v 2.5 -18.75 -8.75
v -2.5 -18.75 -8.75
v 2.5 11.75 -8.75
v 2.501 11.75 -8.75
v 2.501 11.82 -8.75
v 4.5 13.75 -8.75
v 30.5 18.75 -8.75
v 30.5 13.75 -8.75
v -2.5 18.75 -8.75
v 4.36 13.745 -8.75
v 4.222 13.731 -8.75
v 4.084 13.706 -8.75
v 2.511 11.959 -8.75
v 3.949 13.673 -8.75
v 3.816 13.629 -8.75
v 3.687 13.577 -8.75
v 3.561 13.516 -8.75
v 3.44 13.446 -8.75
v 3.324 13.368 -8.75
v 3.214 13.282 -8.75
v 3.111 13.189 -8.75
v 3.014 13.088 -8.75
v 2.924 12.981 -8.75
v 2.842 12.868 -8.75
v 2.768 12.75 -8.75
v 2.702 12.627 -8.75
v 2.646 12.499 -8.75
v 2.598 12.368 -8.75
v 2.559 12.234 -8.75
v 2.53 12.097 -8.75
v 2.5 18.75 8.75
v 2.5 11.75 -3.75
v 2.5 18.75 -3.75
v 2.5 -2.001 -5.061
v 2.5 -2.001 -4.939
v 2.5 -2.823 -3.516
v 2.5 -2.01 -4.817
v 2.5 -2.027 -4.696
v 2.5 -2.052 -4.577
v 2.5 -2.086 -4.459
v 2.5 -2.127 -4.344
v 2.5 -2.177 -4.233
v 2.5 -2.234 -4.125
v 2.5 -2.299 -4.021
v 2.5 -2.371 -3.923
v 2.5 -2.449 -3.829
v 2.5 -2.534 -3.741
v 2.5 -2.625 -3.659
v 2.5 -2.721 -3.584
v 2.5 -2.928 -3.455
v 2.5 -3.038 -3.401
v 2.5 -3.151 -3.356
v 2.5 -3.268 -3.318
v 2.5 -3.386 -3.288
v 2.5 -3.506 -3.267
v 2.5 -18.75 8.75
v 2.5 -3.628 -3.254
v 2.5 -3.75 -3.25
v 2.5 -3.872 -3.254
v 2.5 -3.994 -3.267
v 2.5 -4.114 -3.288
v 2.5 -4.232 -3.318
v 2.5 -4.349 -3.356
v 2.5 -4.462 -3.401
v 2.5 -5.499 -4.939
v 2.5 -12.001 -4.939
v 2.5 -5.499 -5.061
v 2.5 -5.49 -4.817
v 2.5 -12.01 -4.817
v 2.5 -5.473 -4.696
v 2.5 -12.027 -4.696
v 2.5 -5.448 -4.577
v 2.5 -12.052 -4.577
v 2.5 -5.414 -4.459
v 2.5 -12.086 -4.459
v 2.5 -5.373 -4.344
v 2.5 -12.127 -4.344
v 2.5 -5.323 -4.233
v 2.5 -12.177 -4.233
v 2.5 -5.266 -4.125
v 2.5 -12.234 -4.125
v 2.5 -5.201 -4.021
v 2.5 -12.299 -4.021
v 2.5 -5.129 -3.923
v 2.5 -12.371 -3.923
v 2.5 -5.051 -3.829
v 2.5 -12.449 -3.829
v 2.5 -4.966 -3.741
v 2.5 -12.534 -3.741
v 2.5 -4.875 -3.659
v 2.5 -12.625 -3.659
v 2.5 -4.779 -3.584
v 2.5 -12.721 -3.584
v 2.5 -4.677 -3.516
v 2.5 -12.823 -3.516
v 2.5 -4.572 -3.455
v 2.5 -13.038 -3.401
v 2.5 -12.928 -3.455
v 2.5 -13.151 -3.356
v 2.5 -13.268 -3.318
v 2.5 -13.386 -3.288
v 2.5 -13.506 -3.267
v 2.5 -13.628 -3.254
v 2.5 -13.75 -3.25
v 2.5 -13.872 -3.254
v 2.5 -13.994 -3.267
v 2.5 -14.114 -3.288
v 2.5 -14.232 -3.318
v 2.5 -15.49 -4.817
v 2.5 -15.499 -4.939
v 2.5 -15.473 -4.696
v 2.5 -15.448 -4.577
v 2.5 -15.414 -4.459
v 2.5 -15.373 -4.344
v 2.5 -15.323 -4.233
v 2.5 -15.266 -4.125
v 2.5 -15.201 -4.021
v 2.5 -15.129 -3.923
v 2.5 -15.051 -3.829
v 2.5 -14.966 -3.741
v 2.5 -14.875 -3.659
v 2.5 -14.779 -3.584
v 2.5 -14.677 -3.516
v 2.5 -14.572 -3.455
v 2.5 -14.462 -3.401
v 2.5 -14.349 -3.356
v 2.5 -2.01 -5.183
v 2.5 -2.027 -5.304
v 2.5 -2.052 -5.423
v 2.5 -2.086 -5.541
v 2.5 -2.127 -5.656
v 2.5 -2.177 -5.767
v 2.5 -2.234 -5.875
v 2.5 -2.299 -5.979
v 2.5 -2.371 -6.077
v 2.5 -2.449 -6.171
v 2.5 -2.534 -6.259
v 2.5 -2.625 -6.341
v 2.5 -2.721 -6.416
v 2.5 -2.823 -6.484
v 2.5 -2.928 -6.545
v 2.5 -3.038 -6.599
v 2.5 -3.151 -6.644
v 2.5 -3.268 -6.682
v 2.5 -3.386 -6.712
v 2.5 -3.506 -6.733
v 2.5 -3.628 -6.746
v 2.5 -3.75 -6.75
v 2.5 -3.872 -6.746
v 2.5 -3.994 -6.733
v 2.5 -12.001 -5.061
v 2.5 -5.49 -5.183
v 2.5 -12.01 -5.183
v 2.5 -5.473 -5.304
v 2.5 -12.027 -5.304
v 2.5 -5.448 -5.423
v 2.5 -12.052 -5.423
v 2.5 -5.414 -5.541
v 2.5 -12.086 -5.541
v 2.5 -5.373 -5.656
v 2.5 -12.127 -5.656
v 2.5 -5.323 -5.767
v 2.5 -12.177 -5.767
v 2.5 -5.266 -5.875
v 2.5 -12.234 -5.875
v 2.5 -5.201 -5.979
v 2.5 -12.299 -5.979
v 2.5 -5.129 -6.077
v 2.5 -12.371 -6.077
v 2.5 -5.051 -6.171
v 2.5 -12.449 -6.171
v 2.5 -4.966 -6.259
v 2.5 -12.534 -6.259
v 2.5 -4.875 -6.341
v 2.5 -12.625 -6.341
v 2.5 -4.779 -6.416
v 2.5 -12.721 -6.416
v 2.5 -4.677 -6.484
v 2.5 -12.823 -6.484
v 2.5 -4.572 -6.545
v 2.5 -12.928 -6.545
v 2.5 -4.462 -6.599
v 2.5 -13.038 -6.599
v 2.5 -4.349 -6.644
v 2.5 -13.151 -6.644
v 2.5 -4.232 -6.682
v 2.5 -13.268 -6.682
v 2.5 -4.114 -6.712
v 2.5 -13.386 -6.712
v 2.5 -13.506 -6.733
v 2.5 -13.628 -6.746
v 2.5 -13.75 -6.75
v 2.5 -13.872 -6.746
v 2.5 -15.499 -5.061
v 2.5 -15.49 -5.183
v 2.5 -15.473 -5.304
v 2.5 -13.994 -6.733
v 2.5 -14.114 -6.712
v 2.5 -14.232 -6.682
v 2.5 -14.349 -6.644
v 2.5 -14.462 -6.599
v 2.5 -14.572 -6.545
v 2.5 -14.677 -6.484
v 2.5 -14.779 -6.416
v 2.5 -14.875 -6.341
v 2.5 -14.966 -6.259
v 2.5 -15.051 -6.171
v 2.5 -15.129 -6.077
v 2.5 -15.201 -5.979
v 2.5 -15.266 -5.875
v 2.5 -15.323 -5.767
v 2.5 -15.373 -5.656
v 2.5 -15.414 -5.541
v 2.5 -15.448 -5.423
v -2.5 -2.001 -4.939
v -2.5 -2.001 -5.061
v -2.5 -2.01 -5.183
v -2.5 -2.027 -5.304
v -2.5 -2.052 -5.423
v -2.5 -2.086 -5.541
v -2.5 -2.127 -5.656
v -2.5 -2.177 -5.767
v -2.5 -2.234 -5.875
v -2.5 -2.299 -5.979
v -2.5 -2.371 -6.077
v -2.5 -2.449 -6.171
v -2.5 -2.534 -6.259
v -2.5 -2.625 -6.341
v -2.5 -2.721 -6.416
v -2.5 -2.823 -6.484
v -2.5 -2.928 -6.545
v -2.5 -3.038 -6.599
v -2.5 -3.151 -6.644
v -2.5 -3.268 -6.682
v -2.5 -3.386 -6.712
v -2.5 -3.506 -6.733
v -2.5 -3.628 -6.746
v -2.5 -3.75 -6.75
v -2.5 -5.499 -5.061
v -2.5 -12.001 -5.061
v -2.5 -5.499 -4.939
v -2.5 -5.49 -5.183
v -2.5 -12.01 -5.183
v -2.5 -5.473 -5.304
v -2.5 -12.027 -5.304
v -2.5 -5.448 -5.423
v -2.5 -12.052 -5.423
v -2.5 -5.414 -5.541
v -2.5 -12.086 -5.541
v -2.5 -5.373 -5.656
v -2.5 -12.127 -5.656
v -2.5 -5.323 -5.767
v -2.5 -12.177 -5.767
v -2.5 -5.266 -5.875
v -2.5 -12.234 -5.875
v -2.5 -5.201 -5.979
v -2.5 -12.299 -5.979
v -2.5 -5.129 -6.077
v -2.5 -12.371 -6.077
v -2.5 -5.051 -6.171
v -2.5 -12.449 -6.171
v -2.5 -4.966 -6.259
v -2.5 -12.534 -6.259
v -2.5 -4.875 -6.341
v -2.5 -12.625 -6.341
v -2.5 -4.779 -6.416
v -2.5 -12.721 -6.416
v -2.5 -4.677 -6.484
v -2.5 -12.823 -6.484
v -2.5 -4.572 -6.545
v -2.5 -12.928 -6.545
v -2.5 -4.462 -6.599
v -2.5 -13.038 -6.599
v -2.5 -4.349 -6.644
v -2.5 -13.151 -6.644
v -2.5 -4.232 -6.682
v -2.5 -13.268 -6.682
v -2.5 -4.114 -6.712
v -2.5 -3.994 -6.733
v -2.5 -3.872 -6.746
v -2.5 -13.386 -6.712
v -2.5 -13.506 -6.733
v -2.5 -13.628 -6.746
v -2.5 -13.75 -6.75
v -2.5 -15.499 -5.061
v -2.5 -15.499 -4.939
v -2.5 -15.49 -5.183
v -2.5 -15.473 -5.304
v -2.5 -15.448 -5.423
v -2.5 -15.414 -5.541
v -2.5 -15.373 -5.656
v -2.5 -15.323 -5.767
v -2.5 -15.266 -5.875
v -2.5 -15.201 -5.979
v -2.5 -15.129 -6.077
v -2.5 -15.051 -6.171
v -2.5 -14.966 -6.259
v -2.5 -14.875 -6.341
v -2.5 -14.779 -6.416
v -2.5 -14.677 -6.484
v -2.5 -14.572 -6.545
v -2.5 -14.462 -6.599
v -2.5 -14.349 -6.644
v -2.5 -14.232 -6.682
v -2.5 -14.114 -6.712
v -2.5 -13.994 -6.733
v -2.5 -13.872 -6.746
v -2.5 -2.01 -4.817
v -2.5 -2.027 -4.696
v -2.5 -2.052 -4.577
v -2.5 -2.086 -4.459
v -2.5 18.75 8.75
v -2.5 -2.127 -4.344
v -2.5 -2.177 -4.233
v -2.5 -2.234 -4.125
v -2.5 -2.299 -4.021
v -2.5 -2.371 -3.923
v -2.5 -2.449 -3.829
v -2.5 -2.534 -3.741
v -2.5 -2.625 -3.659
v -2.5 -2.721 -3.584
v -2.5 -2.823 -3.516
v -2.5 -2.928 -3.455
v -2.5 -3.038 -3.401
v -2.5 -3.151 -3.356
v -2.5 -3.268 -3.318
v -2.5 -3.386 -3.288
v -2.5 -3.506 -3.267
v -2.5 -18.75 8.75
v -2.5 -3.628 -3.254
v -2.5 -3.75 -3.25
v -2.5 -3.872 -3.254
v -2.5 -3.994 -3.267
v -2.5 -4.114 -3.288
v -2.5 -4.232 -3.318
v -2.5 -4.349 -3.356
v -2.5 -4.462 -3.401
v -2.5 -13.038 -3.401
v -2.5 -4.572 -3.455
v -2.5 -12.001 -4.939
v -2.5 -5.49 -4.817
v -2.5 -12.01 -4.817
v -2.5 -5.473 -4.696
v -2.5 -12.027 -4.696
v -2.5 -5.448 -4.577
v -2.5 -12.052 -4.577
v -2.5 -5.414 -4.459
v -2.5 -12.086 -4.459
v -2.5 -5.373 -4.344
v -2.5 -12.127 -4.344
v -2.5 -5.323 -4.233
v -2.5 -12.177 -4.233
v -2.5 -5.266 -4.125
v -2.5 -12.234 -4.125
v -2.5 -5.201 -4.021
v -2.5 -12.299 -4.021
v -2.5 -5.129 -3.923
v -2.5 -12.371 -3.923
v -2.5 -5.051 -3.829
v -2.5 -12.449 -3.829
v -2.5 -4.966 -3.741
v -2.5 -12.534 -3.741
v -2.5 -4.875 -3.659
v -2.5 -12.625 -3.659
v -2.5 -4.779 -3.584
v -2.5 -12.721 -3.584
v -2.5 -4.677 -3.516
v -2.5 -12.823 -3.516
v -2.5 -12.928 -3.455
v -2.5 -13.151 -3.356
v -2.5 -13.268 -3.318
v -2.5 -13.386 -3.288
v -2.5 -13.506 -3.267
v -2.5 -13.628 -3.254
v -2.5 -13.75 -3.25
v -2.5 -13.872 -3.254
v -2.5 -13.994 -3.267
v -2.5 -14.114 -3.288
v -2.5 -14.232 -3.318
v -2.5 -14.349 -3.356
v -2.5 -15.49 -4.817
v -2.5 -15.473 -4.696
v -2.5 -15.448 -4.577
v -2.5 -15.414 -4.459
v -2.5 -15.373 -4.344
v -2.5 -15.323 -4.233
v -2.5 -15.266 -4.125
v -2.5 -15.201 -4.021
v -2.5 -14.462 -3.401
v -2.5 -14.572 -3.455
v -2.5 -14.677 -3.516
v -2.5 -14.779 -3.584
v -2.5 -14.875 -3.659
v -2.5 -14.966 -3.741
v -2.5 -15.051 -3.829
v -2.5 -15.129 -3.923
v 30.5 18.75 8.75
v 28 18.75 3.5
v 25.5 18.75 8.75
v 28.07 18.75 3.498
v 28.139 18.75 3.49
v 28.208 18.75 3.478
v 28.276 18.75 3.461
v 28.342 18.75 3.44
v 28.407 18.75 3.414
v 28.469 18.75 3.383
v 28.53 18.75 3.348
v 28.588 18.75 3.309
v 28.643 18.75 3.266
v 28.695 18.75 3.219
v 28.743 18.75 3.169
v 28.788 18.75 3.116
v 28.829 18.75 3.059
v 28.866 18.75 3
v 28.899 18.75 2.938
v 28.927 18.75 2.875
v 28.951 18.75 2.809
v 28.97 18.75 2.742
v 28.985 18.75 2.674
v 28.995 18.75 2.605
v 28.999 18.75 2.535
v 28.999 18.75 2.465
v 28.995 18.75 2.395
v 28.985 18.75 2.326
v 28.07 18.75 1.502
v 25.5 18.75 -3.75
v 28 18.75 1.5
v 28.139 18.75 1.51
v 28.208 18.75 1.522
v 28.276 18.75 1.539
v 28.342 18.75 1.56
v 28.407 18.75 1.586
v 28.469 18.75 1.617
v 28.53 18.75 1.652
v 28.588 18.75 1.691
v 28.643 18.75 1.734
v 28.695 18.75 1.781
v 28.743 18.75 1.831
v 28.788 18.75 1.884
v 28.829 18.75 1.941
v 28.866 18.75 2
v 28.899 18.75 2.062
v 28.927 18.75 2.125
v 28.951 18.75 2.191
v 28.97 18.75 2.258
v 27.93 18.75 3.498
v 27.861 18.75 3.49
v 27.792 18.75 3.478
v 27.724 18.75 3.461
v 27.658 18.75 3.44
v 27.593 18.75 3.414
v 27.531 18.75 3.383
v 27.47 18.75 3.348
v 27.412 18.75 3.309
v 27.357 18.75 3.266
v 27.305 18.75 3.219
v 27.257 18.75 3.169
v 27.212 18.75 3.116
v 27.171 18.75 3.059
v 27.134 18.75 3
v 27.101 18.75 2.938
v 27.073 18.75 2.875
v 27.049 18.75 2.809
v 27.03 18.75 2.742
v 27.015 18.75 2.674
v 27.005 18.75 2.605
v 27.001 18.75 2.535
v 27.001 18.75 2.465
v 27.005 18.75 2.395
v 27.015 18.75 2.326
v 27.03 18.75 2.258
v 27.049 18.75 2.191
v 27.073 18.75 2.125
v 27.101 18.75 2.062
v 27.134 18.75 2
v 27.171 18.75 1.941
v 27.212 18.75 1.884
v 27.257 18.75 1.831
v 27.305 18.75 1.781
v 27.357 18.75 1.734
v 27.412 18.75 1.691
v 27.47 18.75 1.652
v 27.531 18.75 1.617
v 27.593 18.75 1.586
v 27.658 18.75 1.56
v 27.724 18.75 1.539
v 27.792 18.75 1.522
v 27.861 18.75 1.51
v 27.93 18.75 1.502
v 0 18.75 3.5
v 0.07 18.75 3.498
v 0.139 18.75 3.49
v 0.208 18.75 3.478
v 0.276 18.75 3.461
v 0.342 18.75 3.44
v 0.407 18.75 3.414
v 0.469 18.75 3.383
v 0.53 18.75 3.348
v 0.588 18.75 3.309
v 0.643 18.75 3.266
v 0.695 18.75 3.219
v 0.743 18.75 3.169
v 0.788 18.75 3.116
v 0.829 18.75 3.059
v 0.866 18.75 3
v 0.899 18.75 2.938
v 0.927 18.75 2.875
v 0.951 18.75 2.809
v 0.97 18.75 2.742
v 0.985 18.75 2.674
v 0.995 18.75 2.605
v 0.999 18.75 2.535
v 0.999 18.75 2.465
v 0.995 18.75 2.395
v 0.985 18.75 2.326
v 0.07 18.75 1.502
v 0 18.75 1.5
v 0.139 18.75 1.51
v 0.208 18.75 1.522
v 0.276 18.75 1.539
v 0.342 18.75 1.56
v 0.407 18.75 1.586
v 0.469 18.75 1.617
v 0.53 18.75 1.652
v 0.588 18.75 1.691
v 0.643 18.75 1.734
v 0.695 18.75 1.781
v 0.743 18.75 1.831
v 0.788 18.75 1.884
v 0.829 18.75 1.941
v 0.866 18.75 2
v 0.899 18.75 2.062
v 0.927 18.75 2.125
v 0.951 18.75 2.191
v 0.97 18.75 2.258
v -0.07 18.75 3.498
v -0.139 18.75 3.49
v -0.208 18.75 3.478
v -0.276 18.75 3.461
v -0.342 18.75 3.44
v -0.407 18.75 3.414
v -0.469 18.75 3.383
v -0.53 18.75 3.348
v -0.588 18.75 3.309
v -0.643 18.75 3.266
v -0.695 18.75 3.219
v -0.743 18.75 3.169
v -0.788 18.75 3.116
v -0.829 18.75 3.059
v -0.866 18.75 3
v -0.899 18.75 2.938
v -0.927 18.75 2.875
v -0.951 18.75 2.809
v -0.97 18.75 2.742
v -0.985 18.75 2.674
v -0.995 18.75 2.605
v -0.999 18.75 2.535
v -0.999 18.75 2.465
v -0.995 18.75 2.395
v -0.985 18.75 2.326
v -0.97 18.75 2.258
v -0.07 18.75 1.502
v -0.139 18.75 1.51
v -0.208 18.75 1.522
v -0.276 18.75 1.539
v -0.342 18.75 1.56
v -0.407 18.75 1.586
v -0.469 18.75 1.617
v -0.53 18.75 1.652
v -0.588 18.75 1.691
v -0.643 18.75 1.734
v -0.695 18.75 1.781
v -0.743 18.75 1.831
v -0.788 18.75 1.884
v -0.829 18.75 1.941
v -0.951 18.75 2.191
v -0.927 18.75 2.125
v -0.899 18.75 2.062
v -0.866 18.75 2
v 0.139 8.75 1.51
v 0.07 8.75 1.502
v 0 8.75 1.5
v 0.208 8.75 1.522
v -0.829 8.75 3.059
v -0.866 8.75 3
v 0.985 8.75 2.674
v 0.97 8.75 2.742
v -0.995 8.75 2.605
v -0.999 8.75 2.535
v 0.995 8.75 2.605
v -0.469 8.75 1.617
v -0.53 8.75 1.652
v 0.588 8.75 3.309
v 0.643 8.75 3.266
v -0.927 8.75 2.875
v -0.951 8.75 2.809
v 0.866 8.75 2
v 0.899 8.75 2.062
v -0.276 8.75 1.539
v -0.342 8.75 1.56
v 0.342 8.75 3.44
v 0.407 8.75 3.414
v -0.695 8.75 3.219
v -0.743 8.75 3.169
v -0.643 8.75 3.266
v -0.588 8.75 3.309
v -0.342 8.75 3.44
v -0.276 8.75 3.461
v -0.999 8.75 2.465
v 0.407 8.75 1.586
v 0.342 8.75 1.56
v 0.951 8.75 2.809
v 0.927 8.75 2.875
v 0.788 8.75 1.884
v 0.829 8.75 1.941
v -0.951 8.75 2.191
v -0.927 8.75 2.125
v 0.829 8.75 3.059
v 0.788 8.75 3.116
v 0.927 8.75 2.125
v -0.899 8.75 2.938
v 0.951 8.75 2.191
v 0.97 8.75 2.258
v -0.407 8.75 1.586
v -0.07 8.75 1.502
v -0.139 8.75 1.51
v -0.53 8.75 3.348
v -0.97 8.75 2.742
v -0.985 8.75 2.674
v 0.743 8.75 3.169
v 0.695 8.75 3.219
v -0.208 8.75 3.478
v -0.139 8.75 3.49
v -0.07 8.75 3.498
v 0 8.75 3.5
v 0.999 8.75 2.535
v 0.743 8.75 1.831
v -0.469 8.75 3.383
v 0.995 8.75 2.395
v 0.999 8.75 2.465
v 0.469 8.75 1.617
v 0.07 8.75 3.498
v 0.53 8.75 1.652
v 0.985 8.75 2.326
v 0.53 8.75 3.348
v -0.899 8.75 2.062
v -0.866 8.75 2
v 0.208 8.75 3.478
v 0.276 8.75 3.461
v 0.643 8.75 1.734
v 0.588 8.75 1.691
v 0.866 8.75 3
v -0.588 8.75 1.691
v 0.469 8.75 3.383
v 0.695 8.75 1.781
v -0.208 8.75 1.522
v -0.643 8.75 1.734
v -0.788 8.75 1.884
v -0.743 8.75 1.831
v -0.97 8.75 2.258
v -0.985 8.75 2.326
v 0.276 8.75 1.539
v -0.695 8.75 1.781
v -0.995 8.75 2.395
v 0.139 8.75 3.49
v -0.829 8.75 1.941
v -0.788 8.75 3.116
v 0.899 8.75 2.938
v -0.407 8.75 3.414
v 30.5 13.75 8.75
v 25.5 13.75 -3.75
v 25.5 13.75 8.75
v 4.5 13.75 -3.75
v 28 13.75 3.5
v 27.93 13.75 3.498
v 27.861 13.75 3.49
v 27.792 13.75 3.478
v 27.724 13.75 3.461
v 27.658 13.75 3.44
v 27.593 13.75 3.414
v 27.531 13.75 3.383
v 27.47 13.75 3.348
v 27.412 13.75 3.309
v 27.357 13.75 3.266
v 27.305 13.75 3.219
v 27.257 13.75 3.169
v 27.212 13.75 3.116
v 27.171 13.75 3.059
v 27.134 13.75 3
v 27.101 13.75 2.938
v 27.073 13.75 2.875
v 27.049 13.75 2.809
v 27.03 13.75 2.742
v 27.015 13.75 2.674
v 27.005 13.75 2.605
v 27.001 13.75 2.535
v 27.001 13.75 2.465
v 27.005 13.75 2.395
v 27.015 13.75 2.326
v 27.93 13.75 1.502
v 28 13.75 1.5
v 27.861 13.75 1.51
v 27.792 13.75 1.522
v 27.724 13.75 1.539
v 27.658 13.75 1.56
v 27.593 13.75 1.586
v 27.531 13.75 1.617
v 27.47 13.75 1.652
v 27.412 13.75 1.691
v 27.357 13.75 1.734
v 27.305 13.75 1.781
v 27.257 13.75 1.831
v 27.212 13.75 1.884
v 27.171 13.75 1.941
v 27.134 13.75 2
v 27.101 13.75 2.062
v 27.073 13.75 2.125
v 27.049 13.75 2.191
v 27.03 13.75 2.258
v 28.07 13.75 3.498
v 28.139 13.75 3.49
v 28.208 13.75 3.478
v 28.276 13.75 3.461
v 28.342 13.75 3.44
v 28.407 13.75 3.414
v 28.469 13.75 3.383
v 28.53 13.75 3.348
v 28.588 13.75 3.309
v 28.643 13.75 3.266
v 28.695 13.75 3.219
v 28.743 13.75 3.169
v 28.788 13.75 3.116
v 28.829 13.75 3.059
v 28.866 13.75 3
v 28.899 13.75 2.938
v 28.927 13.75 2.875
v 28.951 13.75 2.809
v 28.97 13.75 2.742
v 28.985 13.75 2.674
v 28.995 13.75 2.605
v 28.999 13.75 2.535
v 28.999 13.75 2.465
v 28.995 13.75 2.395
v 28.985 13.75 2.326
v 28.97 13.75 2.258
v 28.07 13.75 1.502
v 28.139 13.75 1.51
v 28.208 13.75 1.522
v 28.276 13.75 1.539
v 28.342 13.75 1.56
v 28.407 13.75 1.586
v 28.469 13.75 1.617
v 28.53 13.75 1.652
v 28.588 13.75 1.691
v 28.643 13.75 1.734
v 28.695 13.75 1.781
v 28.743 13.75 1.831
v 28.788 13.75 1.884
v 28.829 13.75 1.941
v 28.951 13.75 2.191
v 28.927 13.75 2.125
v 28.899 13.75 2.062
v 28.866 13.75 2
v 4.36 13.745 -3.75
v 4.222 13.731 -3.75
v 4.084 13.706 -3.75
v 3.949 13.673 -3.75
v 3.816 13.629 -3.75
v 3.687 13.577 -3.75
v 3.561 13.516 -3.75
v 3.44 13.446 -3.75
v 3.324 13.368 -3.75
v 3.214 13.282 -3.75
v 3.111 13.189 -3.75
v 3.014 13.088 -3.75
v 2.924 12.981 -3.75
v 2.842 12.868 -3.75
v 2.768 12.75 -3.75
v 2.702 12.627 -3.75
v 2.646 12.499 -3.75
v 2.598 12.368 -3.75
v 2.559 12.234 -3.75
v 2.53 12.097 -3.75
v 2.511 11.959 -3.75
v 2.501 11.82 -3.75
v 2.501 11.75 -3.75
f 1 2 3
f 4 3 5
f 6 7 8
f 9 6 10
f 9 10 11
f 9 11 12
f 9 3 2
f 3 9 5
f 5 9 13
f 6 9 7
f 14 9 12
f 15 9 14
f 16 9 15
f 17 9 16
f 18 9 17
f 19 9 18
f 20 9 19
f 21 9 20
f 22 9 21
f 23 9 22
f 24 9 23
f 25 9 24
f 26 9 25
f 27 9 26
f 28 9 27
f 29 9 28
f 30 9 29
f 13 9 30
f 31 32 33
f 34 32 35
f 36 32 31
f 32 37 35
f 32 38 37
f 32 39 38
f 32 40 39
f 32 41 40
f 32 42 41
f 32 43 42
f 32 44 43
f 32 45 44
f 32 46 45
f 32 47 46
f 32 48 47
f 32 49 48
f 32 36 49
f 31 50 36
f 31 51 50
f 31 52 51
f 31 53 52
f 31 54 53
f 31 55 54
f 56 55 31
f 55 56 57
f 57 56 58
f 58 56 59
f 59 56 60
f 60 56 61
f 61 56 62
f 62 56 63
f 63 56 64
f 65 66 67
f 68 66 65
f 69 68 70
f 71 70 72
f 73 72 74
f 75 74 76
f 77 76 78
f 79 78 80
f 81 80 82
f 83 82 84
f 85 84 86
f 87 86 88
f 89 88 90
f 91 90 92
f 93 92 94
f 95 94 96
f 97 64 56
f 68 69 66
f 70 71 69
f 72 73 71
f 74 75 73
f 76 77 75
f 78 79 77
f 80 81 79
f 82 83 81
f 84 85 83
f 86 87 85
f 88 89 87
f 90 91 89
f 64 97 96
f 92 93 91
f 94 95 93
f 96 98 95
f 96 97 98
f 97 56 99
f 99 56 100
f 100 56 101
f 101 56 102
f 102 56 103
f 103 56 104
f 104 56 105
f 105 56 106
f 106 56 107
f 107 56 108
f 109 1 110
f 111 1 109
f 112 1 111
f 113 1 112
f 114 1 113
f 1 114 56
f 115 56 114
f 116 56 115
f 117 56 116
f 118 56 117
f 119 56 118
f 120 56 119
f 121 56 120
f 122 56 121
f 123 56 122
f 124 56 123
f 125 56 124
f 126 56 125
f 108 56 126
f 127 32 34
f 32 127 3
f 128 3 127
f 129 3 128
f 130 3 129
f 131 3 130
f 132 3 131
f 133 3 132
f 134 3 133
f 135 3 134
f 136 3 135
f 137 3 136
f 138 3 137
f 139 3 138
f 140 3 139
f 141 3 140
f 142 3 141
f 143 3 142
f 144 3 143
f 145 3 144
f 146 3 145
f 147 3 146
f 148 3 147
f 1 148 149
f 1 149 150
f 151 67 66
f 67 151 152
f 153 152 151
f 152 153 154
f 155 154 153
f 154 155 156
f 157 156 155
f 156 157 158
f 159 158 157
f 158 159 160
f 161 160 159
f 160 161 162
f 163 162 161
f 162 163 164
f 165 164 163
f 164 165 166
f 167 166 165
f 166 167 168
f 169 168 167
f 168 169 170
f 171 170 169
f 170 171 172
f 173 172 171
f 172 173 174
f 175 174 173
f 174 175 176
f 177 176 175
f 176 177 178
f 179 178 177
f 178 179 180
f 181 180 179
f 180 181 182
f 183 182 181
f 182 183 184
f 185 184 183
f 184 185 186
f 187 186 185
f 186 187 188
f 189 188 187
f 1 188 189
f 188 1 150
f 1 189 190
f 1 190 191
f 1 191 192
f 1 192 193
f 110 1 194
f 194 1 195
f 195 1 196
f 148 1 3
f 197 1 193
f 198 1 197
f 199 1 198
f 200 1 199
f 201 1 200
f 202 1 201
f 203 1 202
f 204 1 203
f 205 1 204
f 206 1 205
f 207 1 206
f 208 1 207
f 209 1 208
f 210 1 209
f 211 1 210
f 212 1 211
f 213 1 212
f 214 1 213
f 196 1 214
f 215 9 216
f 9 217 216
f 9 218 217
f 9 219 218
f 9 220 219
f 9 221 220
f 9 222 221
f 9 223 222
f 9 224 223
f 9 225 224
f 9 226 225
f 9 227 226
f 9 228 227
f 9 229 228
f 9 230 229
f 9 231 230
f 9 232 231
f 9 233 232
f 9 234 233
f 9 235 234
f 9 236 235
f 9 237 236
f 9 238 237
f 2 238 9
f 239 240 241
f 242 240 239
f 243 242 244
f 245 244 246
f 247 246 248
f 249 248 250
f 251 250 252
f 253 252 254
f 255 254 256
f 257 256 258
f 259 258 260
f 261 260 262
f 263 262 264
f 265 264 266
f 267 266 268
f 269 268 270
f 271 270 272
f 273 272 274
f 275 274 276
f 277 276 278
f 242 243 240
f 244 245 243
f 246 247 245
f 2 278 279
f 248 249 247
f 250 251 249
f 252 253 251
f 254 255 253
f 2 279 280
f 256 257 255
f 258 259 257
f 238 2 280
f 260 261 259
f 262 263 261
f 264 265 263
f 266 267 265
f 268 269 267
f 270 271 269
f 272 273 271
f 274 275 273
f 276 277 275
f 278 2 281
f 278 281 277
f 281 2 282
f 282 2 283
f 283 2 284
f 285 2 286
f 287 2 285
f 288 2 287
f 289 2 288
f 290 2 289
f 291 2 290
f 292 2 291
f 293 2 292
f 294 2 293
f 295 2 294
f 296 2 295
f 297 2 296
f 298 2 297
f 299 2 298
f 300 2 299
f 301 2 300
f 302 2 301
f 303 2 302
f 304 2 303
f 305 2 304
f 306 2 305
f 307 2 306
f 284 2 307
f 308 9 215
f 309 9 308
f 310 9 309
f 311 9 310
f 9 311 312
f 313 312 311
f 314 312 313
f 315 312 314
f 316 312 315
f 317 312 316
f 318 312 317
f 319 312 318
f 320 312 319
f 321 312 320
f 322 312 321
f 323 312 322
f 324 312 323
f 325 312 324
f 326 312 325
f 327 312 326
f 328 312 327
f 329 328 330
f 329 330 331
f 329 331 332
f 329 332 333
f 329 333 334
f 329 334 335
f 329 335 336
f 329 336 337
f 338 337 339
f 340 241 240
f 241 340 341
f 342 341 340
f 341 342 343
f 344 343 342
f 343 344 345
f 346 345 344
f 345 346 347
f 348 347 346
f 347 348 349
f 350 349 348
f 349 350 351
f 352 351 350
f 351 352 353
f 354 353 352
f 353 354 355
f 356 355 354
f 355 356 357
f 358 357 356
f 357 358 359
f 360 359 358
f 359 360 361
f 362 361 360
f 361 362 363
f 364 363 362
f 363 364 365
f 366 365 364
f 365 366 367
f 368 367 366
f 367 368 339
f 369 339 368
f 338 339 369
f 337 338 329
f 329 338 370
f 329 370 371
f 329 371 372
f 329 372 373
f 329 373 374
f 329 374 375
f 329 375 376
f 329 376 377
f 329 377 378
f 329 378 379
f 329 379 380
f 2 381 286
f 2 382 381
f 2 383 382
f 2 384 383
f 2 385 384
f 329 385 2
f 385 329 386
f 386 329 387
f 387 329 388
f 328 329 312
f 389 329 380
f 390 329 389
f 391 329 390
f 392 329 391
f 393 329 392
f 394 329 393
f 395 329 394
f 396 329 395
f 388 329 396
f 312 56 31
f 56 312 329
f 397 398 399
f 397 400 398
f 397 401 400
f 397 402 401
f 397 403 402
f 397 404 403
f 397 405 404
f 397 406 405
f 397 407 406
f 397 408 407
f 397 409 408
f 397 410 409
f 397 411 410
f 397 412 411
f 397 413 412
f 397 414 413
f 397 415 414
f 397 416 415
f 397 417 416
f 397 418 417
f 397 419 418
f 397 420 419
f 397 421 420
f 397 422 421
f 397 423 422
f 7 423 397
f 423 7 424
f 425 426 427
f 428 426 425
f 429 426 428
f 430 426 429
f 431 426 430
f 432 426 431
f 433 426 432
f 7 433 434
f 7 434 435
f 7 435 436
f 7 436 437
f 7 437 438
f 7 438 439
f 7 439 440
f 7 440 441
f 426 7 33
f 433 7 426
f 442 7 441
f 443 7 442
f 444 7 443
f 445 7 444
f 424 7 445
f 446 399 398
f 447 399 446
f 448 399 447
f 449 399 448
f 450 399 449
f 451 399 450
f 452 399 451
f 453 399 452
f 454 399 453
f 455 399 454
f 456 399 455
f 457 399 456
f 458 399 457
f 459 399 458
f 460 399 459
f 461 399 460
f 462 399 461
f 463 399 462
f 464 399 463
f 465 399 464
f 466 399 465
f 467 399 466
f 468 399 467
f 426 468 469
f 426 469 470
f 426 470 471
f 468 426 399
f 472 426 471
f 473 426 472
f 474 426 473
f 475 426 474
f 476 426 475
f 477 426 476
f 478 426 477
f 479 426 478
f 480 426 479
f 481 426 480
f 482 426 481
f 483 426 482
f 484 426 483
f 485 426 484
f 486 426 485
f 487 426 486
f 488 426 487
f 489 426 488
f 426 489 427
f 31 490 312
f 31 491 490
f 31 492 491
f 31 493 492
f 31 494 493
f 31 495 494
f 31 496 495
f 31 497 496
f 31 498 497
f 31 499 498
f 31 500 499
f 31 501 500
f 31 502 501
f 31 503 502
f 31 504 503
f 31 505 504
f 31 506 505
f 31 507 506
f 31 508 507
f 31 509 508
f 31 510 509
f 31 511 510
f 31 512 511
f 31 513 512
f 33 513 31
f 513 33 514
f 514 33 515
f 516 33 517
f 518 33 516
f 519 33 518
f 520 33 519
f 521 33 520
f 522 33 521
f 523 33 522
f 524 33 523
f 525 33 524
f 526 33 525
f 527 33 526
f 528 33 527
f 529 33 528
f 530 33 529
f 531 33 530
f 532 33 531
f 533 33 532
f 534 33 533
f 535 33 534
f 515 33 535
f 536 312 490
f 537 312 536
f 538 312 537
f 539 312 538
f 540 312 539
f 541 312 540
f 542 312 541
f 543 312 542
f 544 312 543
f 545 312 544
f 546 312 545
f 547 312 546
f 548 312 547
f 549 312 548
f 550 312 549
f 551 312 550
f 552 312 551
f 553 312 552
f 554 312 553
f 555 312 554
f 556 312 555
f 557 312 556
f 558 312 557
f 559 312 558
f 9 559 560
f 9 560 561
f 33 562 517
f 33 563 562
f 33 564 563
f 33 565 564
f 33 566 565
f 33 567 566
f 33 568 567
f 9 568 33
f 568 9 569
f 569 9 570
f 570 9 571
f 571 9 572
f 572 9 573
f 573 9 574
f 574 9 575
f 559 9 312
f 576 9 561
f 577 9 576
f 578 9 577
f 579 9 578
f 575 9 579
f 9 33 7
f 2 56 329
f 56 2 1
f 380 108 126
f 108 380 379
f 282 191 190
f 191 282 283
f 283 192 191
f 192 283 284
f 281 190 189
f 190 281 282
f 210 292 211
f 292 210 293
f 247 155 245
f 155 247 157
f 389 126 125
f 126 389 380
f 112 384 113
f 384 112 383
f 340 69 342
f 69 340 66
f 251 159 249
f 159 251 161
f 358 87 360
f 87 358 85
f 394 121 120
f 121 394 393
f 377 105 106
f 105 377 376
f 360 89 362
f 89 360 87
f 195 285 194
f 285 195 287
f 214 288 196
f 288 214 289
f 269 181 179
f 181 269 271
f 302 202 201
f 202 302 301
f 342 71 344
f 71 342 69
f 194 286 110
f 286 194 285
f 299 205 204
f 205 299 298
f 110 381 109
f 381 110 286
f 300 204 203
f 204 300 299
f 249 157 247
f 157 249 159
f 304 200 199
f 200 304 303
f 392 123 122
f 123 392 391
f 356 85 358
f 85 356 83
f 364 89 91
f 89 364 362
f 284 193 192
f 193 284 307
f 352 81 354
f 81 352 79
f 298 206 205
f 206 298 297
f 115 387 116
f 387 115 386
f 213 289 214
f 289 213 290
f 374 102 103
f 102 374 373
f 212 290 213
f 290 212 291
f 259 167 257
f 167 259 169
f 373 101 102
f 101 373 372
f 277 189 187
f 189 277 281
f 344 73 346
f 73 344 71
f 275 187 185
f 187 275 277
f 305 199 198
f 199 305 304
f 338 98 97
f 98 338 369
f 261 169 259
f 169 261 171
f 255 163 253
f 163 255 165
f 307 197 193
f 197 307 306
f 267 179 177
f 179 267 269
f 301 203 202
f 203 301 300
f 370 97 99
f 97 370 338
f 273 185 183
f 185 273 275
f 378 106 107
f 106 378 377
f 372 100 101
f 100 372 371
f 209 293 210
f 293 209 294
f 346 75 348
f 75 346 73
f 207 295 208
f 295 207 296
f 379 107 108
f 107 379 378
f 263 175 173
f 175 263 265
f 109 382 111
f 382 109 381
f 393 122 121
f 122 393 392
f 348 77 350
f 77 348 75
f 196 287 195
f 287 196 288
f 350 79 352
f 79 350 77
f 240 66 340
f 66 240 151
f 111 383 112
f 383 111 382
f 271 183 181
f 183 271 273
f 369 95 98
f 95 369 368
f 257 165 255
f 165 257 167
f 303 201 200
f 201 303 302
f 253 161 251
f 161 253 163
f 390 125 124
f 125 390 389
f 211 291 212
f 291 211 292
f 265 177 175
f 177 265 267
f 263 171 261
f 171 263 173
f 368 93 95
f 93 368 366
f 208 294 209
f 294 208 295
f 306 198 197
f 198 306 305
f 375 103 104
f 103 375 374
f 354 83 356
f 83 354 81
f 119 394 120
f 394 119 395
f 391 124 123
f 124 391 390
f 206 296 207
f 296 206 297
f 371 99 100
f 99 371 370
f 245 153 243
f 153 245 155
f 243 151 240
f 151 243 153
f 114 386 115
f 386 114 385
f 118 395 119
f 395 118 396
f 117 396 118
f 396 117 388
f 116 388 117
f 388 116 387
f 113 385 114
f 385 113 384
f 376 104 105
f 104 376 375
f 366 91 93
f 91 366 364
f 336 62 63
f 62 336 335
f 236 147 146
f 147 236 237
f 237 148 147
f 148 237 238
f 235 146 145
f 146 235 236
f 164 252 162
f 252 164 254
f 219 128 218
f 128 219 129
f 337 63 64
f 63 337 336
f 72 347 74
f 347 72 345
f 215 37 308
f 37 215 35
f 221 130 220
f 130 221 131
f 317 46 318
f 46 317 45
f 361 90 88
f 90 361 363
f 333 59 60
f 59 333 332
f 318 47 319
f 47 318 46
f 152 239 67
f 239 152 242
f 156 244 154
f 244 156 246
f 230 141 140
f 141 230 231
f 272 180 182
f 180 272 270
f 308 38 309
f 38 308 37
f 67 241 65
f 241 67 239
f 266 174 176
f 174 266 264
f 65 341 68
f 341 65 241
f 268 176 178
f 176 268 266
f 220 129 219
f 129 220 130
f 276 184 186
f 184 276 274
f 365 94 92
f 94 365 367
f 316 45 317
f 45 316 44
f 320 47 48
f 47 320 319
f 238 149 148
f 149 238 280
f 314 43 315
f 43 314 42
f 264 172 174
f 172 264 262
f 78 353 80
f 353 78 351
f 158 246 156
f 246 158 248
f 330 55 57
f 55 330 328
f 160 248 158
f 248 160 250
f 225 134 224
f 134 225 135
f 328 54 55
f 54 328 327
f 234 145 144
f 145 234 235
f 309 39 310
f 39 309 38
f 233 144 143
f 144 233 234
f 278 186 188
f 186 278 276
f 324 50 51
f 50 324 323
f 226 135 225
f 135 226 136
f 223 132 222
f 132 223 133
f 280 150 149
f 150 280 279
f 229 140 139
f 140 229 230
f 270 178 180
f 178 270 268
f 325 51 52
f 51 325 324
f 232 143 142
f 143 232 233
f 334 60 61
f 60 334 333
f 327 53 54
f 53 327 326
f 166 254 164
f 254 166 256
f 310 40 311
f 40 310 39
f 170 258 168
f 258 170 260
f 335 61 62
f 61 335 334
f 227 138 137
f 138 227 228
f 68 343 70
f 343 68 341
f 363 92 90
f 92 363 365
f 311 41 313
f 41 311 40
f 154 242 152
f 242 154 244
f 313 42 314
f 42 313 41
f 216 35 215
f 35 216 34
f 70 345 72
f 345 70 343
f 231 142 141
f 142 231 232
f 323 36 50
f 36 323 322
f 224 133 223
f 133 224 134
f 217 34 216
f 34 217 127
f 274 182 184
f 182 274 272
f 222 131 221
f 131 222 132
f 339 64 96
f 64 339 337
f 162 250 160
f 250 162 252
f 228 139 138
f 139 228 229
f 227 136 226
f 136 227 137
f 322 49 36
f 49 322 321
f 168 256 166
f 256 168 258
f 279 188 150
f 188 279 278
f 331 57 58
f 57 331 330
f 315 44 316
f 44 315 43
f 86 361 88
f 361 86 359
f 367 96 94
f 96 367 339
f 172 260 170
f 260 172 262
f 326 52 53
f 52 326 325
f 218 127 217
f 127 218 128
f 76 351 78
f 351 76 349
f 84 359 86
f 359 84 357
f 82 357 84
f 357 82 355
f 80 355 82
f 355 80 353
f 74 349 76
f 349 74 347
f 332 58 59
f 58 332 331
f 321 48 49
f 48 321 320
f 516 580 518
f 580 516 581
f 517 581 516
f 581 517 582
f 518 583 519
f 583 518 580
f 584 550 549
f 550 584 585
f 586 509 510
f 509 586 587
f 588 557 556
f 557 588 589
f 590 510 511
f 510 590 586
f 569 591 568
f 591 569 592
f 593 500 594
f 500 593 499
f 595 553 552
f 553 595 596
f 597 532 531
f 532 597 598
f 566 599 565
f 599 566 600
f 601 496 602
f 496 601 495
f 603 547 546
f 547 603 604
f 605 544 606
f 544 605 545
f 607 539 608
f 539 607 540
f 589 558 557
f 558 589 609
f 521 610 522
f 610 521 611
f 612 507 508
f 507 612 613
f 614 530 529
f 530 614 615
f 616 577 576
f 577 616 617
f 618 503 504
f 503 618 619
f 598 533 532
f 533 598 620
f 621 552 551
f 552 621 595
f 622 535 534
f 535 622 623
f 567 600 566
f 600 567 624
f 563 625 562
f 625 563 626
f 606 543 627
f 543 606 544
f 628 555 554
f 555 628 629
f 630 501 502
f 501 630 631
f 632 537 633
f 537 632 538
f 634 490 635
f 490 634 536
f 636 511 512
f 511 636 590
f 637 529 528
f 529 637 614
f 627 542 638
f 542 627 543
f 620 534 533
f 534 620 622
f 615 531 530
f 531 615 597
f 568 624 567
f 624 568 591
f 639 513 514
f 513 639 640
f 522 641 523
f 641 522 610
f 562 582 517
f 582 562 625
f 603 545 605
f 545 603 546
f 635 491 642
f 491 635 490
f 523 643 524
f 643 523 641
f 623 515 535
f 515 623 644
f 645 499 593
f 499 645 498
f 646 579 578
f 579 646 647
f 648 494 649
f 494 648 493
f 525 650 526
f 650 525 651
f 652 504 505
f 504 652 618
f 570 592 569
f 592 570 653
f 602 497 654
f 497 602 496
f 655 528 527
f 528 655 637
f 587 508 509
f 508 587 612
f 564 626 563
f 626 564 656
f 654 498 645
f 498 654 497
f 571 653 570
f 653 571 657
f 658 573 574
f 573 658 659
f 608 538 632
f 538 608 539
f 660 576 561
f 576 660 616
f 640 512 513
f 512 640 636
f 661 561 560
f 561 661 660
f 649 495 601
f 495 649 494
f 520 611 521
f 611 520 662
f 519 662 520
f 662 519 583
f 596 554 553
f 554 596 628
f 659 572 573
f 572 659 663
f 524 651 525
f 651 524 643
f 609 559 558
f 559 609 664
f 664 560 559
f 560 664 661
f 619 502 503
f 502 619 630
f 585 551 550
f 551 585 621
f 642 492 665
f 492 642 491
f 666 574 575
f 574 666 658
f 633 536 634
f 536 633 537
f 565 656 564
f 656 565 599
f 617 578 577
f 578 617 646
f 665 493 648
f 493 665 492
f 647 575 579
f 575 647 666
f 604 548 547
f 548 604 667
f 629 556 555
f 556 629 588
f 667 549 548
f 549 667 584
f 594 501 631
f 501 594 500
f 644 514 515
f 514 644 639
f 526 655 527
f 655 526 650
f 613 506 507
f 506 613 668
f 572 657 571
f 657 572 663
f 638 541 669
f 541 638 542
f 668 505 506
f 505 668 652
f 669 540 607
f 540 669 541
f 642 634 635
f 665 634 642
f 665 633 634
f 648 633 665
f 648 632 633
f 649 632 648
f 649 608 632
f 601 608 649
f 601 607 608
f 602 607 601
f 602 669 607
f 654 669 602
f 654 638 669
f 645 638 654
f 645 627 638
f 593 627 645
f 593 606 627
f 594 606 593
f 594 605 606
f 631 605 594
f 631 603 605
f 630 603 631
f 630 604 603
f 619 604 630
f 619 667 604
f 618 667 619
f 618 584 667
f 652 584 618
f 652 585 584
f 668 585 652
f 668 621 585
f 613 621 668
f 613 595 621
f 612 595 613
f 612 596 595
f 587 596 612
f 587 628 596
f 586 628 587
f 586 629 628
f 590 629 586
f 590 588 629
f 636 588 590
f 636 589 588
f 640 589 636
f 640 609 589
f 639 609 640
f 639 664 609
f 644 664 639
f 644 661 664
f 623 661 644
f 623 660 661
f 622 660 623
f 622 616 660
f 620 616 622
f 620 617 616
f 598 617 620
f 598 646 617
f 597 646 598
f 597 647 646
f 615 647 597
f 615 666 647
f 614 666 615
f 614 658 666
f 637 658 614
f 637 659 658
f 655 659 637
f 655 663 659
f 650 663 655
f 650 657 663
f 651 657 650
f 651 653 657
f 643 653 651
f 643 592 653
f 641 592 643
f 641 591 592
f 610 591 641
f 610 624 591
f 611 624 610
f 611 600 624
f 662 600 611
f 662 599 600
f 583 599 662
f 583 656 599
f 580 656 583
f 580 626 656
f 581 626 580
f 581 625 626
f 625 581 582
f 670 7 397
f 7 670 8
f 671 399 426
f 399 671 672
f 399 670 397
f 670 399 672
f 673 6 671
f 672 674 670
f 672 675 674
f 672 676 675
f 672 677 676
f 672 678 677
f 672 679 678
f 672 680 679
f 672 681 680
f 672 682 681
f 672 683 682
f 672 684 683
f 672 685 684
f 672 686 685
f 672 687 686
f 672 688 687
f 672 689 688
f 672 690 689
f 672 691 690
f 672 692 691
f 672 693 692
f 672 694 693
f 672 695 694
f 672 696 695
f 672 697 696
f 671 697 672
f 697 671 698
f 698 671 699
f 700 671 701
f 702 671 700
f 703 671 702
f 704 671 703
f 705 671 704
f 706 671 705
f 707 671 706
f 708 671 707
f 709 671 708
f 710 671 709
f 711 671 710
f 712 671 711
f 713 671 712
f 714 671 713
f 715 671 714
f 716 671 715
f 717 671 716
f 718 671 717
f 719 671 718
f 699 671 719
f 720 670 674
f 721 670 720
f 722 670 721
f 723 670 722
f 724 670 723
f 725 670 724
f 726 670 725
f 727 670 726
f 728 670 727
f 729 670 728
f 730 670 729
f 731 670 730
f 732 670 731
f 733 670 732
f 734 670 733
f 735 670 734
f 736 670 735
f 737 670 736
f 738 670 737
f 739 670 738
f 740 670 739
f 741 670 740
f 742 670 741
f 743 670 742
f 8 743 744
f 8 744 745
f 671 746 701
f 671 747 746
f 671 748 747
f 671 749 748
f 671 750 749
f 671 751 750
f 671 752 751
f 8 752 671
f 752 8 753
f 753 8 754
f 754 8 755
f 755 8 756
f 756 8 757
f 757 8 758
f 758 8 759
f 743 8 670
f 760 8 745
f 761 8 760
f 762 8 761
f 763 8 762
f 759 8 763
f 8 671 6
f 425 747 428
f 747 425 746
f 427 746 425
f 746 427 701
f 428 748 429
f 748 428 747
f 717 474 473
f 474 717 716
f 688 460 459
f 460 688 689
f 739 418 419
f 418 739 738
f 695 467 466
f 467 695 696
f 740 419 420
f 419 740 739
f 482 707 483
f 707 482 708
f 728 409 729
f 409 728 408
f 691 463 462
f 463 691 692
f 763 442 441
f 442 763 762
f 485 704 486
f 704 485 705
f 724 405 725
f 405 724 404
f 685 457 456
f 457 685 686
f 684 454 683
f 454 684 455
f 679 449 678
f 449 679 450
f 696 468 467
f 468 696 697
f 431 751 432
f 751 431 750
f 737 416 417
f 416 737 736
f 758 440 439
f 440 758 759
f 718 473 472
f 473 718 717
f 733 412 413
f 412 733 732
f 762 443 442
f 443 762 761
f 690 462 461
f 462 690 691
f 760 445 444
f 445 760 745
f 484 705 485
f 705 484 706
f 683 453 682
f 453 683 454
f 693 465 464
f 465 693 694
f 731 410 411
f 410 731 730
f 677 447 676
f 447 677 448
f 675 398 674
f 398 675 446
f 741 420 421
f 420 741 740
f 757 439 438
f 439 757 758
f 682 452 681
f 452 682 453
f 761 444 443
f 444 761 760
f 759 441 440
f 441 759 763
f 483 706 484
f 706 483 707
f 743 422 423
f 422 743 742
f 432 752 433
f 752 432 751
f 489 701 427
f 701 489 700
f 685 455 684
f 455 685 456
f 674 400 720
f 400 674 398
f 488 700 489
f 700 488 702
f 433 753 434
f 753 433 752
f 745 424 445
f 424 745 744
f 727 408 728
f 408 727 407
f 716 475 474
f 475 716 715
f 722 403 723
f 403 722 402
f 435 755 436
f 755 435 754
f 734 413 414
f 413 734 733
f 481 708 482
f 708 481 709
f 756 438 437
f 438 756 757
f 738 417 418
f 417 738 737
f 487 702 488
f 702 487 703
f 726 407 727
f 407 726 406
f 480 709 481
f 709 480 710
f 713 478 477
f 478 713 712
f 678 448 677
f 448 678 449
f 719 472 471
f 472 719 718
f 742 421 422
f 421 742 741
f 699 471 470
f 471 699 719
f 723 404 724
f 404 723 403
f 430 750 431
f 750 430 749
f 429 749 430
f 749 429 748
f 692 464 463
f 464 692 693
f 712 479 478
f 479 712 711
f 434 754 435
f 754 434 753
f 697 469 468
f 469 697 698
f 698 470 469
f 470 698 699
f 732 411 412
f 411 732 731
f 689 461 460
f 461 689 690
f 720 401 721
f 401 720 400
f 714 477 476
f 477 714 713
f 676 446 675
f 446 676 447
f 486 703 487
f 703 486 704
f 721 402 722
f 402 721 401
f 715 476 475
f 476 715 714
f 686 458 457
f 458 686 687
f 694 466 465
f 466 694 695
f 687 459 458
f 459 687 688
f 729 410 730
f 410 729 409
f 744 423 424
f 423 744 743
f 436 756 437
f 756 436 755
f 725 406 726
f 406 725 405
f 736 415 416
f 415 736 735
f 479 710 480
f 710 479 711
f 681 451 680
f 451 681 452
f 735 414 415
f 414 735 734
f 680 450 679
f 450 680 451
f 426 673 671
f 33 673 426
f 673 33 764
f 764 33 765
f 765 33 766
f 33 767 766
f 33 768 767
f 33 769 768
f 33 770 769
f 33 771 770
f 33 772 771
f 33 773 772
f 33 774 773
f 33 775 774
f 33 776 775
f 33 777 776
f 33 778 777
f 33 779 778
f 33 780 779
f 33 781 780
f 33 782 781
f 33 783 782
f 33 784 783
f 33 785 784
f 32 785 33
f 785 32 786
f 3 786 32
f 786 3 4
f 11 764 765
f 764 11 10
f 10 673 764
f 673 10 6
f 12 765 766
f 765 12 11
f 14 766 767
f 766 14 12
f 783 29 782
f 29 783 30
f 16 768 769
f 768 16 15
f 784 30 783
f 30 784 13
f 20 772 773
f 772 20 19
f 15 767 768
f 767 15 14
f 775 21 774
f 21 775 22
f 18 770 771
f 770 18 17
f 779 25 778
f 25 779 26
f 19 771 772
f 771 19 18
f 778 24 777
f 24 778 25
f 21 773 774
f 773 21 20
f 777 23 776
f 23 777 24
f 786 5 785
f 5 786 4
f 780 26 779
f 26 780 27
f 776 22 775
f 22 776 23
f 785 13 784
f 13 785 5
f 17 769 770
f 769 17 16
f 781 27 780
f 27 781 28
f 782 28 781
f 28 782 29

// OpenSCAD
$fn = 90;
screwDiameter = 3.5;

module screwTab(width, height, holeDiameter) {
    difference() {
        union() {
            cylinder(d=width, h=height, center=true);
            translate([width / 4, 0, 0]) cube([width / 2, width, height], center = true);
        };
        cylinder(d=holeDiameter, h=height, center=true);
    };
};

module innerCornerRadius(radius, depth) {
    difference() {
        cube([radius, radius, depth], center=true);
        translate([-radius / 2, -radius / 2, 0]) cylinder(r=radius, h=depth, center=true);
    };
};

module mountingPostV2(length, width, height, holeDiameter) {
    difference() {
        cube([length, width, height], center=true);
        rotate([90, 0, 0]) cylinder(d=holeDiameter, h=width, center=true);
    };
};


module mountVersion1() {

    servoMountLength = 5;
    servoMountWidth = 12;
    servoMountDepth = 2.5;
    servoTopHeight = 4;
    baseLength = 22.5;
    baseWidth  = (servoTopHeight * 2) + servoMountDepth;
    baseHeight = 3;

    // Base
    totalLength = baseLength + (2 * servoMountLength);
    cube([totalLength, baseWidth, baseHeight], center=true);
    translate([(totalLength + baseWidth) / 2, 0, 0])
        rotate([0, 0, 180])
            screwTab(baseWidth, baseHeight, screwDiameter);
    translate([-(totalLength + baseWidth) / 2, 0, 0])
        screwTab(baseWidth, baseHeight, screwDiameter);

    // Posts
    translate([(totalLength - servoMountLength) / 2, (baseWidth - servoTopHeight) / 2, (baseHeight + servoMountWidth) / 2])
        mountingPostV2(servoMountLength, servoTopHeight, servoMountWidth);
    translate([(totalLength + (servoTopHeight / 2)) / 2, (baseWidth - servoTopHeight) / 2, (baseHeight + servoTopHeight / 2) /2])
        rotate([-90, 0, 180])
            innerCornerRadius(servoTopHeight / 2, servoTopHeight);

    translate([-(totalLength - servoMountLength) / 2, (baseWidth - servoTopHeight) / 2, (baseHeight + servoMountWidth) / 2])
        mountingPostV2(servoMountLength, servoTopHeight, servoMountWidth);
    translate([-(totalLength + (servoTopHeight / 2)) / 2, (baseWidth - servoTopHeight) / 2, (baseHeight + servoTopHeight / 2) /2])
        rotate([-90, 0, 0])
            innerCornerRadius(servoTopHeight / 2, servoTopHeight);

};



module mountVersion2() {

    servoX = 23;
    servoY = 12.5;
    servoZ = 17.5;

    servoSidePlateX = 5;
    servoSidePlateY = 5;
    servoSidePlateZ = servoX;

    servoMountX = servoY + servoSidePlateX;
    servoMountY = 5;
    servoMountZ = 5;

    baseX = servoY + servoSidePlateX;
    baseY = servoZ + 20;
    baseZ = 5;

    screwDiameter = 3.5;
    screwHeadDiameter = 10;
    screwLength = 10;
    screwThreadDiameter = 2;

    smallRadius = 2;

    difference() {
        cube([baseX, baseY, baseZ], center = true);
        translate([servoSidePlateX, -(baseY - screwHeadDiameter) / 2, 0])
            cylinder(d=screwDiameter, h=baseZ, center=true);
        translate([servoSidePlateX, -((baseY - screwHeadDiameter) / 2) + screwHeadDiameter, 0])
            cylinder(d=screwDiameter, h=baseZ, center=true);
        translate([-servoSidePlateY / 2, (baseY - screwLength) / 2, 0])
            rotate([90, 0, 0])
                cylinder(d=screwThreadDiameter, h=screwLength, center=true);

    };

    translate([(baseX - servoSidePlateX) / 2, (baseY - servoSidePlateY) / 2, (baseZ + servoSidePlateZ) / 2])
        cube([servoSidePlateX, servoSidePlateY, servoSidePlateZ], center = true);

    translate([0, (baseY - servoMountY) / 2, servoSidePlateZ + servoMountZ])
        difference() {
            cube([servoMountX, servoMountY, servoMountZ], center = true);
            translate([-servoSidePlateY / 2, 0, 0])
                rotate([90, 0, 0])
                    cylinder(d=screwThreadDiameter, h=servoMountY, center=true);
        };

    translate([(baseX - servoSidePlateX) / 2, ((baseY - smallRadius) / 2) - servoMountY, (baseZ + smallRadius) / 2])
        rotate([-90, 0, 90])
            innerCornerRadius(smallRadius, servoSidePlateX);

};


module mountVersion3() {

    screwDiameter = 3.5;
    screwHeadDiameter = 10;
    screwThreadDiameter = 2;

    servoX = 23;
    servoY = 17.5;
    servoZ = 12.5;

    mountingPostX = 5;
    mountingPostY = 4;
    mountingPostZ = servoZ;

    baseX = servoX + (2 * mountingPostX);
    baseY = servoY + screwHeadDiameter;
    baseZ = 3;


    difference() {
        union() {
            translate([0, screwHeadDiameter / 4, 0])
                cube([baseX, baseY - (screwHeadDiameter / 2), baseZ], center=true);
            translate([0, -(baseY - screwHeadDiameter) / 2, 0])
                cube([baseX - screwHeadDiameter, screwHeadDiameter, baseZ], center = true);
            translate([(baseX - screwHeadDiameter) / 2, -(baseY - screwHeadDiameter) / 2, 0])
                cylinder(d=screwHeadDiameter, h=baseZ, center=true);
            translate([-(baseX - screwHeadDiameter) / 2, -(baseY - screwHeadDiameter) / 2, 0])
                cylinder(d=screwHeadDiameter, h=baseZ, center=true);
        };
        translate([(baseX - screwHeadDiameter) / 2, -(baseY - screwHeadDiameter) / 2, 0])
            cylinder(d=screwDiameter, h=baseZ, center=true);
        translate([-(baseX - screwHeadDiameter) / 2, -(baseY - screwHeadDiameter) / 2, 0])
            cylinder(d=screwDiameter, h=baseZ, center=true);

    };

    translate([(baseX - mountingPostX) / 2, (baseY - mountingPostY) / 2, (mountingPostZ + baseZ) / 2])
        mountingPostV2(mountingPostX, mountingPostY, mountingPostZ, screwThreadDiameter);
    translate([-(baseX - mountingPostX) / 2, (baseY - mountingPostY) / 2, (mountingPostZ + baseZ) / 2])
        mountingPostV2(mountingPostX, mountingPostY, mountingPostZ, screwThreadDiameter);


};

rotate([0,90,0])
    mountVersion2();
